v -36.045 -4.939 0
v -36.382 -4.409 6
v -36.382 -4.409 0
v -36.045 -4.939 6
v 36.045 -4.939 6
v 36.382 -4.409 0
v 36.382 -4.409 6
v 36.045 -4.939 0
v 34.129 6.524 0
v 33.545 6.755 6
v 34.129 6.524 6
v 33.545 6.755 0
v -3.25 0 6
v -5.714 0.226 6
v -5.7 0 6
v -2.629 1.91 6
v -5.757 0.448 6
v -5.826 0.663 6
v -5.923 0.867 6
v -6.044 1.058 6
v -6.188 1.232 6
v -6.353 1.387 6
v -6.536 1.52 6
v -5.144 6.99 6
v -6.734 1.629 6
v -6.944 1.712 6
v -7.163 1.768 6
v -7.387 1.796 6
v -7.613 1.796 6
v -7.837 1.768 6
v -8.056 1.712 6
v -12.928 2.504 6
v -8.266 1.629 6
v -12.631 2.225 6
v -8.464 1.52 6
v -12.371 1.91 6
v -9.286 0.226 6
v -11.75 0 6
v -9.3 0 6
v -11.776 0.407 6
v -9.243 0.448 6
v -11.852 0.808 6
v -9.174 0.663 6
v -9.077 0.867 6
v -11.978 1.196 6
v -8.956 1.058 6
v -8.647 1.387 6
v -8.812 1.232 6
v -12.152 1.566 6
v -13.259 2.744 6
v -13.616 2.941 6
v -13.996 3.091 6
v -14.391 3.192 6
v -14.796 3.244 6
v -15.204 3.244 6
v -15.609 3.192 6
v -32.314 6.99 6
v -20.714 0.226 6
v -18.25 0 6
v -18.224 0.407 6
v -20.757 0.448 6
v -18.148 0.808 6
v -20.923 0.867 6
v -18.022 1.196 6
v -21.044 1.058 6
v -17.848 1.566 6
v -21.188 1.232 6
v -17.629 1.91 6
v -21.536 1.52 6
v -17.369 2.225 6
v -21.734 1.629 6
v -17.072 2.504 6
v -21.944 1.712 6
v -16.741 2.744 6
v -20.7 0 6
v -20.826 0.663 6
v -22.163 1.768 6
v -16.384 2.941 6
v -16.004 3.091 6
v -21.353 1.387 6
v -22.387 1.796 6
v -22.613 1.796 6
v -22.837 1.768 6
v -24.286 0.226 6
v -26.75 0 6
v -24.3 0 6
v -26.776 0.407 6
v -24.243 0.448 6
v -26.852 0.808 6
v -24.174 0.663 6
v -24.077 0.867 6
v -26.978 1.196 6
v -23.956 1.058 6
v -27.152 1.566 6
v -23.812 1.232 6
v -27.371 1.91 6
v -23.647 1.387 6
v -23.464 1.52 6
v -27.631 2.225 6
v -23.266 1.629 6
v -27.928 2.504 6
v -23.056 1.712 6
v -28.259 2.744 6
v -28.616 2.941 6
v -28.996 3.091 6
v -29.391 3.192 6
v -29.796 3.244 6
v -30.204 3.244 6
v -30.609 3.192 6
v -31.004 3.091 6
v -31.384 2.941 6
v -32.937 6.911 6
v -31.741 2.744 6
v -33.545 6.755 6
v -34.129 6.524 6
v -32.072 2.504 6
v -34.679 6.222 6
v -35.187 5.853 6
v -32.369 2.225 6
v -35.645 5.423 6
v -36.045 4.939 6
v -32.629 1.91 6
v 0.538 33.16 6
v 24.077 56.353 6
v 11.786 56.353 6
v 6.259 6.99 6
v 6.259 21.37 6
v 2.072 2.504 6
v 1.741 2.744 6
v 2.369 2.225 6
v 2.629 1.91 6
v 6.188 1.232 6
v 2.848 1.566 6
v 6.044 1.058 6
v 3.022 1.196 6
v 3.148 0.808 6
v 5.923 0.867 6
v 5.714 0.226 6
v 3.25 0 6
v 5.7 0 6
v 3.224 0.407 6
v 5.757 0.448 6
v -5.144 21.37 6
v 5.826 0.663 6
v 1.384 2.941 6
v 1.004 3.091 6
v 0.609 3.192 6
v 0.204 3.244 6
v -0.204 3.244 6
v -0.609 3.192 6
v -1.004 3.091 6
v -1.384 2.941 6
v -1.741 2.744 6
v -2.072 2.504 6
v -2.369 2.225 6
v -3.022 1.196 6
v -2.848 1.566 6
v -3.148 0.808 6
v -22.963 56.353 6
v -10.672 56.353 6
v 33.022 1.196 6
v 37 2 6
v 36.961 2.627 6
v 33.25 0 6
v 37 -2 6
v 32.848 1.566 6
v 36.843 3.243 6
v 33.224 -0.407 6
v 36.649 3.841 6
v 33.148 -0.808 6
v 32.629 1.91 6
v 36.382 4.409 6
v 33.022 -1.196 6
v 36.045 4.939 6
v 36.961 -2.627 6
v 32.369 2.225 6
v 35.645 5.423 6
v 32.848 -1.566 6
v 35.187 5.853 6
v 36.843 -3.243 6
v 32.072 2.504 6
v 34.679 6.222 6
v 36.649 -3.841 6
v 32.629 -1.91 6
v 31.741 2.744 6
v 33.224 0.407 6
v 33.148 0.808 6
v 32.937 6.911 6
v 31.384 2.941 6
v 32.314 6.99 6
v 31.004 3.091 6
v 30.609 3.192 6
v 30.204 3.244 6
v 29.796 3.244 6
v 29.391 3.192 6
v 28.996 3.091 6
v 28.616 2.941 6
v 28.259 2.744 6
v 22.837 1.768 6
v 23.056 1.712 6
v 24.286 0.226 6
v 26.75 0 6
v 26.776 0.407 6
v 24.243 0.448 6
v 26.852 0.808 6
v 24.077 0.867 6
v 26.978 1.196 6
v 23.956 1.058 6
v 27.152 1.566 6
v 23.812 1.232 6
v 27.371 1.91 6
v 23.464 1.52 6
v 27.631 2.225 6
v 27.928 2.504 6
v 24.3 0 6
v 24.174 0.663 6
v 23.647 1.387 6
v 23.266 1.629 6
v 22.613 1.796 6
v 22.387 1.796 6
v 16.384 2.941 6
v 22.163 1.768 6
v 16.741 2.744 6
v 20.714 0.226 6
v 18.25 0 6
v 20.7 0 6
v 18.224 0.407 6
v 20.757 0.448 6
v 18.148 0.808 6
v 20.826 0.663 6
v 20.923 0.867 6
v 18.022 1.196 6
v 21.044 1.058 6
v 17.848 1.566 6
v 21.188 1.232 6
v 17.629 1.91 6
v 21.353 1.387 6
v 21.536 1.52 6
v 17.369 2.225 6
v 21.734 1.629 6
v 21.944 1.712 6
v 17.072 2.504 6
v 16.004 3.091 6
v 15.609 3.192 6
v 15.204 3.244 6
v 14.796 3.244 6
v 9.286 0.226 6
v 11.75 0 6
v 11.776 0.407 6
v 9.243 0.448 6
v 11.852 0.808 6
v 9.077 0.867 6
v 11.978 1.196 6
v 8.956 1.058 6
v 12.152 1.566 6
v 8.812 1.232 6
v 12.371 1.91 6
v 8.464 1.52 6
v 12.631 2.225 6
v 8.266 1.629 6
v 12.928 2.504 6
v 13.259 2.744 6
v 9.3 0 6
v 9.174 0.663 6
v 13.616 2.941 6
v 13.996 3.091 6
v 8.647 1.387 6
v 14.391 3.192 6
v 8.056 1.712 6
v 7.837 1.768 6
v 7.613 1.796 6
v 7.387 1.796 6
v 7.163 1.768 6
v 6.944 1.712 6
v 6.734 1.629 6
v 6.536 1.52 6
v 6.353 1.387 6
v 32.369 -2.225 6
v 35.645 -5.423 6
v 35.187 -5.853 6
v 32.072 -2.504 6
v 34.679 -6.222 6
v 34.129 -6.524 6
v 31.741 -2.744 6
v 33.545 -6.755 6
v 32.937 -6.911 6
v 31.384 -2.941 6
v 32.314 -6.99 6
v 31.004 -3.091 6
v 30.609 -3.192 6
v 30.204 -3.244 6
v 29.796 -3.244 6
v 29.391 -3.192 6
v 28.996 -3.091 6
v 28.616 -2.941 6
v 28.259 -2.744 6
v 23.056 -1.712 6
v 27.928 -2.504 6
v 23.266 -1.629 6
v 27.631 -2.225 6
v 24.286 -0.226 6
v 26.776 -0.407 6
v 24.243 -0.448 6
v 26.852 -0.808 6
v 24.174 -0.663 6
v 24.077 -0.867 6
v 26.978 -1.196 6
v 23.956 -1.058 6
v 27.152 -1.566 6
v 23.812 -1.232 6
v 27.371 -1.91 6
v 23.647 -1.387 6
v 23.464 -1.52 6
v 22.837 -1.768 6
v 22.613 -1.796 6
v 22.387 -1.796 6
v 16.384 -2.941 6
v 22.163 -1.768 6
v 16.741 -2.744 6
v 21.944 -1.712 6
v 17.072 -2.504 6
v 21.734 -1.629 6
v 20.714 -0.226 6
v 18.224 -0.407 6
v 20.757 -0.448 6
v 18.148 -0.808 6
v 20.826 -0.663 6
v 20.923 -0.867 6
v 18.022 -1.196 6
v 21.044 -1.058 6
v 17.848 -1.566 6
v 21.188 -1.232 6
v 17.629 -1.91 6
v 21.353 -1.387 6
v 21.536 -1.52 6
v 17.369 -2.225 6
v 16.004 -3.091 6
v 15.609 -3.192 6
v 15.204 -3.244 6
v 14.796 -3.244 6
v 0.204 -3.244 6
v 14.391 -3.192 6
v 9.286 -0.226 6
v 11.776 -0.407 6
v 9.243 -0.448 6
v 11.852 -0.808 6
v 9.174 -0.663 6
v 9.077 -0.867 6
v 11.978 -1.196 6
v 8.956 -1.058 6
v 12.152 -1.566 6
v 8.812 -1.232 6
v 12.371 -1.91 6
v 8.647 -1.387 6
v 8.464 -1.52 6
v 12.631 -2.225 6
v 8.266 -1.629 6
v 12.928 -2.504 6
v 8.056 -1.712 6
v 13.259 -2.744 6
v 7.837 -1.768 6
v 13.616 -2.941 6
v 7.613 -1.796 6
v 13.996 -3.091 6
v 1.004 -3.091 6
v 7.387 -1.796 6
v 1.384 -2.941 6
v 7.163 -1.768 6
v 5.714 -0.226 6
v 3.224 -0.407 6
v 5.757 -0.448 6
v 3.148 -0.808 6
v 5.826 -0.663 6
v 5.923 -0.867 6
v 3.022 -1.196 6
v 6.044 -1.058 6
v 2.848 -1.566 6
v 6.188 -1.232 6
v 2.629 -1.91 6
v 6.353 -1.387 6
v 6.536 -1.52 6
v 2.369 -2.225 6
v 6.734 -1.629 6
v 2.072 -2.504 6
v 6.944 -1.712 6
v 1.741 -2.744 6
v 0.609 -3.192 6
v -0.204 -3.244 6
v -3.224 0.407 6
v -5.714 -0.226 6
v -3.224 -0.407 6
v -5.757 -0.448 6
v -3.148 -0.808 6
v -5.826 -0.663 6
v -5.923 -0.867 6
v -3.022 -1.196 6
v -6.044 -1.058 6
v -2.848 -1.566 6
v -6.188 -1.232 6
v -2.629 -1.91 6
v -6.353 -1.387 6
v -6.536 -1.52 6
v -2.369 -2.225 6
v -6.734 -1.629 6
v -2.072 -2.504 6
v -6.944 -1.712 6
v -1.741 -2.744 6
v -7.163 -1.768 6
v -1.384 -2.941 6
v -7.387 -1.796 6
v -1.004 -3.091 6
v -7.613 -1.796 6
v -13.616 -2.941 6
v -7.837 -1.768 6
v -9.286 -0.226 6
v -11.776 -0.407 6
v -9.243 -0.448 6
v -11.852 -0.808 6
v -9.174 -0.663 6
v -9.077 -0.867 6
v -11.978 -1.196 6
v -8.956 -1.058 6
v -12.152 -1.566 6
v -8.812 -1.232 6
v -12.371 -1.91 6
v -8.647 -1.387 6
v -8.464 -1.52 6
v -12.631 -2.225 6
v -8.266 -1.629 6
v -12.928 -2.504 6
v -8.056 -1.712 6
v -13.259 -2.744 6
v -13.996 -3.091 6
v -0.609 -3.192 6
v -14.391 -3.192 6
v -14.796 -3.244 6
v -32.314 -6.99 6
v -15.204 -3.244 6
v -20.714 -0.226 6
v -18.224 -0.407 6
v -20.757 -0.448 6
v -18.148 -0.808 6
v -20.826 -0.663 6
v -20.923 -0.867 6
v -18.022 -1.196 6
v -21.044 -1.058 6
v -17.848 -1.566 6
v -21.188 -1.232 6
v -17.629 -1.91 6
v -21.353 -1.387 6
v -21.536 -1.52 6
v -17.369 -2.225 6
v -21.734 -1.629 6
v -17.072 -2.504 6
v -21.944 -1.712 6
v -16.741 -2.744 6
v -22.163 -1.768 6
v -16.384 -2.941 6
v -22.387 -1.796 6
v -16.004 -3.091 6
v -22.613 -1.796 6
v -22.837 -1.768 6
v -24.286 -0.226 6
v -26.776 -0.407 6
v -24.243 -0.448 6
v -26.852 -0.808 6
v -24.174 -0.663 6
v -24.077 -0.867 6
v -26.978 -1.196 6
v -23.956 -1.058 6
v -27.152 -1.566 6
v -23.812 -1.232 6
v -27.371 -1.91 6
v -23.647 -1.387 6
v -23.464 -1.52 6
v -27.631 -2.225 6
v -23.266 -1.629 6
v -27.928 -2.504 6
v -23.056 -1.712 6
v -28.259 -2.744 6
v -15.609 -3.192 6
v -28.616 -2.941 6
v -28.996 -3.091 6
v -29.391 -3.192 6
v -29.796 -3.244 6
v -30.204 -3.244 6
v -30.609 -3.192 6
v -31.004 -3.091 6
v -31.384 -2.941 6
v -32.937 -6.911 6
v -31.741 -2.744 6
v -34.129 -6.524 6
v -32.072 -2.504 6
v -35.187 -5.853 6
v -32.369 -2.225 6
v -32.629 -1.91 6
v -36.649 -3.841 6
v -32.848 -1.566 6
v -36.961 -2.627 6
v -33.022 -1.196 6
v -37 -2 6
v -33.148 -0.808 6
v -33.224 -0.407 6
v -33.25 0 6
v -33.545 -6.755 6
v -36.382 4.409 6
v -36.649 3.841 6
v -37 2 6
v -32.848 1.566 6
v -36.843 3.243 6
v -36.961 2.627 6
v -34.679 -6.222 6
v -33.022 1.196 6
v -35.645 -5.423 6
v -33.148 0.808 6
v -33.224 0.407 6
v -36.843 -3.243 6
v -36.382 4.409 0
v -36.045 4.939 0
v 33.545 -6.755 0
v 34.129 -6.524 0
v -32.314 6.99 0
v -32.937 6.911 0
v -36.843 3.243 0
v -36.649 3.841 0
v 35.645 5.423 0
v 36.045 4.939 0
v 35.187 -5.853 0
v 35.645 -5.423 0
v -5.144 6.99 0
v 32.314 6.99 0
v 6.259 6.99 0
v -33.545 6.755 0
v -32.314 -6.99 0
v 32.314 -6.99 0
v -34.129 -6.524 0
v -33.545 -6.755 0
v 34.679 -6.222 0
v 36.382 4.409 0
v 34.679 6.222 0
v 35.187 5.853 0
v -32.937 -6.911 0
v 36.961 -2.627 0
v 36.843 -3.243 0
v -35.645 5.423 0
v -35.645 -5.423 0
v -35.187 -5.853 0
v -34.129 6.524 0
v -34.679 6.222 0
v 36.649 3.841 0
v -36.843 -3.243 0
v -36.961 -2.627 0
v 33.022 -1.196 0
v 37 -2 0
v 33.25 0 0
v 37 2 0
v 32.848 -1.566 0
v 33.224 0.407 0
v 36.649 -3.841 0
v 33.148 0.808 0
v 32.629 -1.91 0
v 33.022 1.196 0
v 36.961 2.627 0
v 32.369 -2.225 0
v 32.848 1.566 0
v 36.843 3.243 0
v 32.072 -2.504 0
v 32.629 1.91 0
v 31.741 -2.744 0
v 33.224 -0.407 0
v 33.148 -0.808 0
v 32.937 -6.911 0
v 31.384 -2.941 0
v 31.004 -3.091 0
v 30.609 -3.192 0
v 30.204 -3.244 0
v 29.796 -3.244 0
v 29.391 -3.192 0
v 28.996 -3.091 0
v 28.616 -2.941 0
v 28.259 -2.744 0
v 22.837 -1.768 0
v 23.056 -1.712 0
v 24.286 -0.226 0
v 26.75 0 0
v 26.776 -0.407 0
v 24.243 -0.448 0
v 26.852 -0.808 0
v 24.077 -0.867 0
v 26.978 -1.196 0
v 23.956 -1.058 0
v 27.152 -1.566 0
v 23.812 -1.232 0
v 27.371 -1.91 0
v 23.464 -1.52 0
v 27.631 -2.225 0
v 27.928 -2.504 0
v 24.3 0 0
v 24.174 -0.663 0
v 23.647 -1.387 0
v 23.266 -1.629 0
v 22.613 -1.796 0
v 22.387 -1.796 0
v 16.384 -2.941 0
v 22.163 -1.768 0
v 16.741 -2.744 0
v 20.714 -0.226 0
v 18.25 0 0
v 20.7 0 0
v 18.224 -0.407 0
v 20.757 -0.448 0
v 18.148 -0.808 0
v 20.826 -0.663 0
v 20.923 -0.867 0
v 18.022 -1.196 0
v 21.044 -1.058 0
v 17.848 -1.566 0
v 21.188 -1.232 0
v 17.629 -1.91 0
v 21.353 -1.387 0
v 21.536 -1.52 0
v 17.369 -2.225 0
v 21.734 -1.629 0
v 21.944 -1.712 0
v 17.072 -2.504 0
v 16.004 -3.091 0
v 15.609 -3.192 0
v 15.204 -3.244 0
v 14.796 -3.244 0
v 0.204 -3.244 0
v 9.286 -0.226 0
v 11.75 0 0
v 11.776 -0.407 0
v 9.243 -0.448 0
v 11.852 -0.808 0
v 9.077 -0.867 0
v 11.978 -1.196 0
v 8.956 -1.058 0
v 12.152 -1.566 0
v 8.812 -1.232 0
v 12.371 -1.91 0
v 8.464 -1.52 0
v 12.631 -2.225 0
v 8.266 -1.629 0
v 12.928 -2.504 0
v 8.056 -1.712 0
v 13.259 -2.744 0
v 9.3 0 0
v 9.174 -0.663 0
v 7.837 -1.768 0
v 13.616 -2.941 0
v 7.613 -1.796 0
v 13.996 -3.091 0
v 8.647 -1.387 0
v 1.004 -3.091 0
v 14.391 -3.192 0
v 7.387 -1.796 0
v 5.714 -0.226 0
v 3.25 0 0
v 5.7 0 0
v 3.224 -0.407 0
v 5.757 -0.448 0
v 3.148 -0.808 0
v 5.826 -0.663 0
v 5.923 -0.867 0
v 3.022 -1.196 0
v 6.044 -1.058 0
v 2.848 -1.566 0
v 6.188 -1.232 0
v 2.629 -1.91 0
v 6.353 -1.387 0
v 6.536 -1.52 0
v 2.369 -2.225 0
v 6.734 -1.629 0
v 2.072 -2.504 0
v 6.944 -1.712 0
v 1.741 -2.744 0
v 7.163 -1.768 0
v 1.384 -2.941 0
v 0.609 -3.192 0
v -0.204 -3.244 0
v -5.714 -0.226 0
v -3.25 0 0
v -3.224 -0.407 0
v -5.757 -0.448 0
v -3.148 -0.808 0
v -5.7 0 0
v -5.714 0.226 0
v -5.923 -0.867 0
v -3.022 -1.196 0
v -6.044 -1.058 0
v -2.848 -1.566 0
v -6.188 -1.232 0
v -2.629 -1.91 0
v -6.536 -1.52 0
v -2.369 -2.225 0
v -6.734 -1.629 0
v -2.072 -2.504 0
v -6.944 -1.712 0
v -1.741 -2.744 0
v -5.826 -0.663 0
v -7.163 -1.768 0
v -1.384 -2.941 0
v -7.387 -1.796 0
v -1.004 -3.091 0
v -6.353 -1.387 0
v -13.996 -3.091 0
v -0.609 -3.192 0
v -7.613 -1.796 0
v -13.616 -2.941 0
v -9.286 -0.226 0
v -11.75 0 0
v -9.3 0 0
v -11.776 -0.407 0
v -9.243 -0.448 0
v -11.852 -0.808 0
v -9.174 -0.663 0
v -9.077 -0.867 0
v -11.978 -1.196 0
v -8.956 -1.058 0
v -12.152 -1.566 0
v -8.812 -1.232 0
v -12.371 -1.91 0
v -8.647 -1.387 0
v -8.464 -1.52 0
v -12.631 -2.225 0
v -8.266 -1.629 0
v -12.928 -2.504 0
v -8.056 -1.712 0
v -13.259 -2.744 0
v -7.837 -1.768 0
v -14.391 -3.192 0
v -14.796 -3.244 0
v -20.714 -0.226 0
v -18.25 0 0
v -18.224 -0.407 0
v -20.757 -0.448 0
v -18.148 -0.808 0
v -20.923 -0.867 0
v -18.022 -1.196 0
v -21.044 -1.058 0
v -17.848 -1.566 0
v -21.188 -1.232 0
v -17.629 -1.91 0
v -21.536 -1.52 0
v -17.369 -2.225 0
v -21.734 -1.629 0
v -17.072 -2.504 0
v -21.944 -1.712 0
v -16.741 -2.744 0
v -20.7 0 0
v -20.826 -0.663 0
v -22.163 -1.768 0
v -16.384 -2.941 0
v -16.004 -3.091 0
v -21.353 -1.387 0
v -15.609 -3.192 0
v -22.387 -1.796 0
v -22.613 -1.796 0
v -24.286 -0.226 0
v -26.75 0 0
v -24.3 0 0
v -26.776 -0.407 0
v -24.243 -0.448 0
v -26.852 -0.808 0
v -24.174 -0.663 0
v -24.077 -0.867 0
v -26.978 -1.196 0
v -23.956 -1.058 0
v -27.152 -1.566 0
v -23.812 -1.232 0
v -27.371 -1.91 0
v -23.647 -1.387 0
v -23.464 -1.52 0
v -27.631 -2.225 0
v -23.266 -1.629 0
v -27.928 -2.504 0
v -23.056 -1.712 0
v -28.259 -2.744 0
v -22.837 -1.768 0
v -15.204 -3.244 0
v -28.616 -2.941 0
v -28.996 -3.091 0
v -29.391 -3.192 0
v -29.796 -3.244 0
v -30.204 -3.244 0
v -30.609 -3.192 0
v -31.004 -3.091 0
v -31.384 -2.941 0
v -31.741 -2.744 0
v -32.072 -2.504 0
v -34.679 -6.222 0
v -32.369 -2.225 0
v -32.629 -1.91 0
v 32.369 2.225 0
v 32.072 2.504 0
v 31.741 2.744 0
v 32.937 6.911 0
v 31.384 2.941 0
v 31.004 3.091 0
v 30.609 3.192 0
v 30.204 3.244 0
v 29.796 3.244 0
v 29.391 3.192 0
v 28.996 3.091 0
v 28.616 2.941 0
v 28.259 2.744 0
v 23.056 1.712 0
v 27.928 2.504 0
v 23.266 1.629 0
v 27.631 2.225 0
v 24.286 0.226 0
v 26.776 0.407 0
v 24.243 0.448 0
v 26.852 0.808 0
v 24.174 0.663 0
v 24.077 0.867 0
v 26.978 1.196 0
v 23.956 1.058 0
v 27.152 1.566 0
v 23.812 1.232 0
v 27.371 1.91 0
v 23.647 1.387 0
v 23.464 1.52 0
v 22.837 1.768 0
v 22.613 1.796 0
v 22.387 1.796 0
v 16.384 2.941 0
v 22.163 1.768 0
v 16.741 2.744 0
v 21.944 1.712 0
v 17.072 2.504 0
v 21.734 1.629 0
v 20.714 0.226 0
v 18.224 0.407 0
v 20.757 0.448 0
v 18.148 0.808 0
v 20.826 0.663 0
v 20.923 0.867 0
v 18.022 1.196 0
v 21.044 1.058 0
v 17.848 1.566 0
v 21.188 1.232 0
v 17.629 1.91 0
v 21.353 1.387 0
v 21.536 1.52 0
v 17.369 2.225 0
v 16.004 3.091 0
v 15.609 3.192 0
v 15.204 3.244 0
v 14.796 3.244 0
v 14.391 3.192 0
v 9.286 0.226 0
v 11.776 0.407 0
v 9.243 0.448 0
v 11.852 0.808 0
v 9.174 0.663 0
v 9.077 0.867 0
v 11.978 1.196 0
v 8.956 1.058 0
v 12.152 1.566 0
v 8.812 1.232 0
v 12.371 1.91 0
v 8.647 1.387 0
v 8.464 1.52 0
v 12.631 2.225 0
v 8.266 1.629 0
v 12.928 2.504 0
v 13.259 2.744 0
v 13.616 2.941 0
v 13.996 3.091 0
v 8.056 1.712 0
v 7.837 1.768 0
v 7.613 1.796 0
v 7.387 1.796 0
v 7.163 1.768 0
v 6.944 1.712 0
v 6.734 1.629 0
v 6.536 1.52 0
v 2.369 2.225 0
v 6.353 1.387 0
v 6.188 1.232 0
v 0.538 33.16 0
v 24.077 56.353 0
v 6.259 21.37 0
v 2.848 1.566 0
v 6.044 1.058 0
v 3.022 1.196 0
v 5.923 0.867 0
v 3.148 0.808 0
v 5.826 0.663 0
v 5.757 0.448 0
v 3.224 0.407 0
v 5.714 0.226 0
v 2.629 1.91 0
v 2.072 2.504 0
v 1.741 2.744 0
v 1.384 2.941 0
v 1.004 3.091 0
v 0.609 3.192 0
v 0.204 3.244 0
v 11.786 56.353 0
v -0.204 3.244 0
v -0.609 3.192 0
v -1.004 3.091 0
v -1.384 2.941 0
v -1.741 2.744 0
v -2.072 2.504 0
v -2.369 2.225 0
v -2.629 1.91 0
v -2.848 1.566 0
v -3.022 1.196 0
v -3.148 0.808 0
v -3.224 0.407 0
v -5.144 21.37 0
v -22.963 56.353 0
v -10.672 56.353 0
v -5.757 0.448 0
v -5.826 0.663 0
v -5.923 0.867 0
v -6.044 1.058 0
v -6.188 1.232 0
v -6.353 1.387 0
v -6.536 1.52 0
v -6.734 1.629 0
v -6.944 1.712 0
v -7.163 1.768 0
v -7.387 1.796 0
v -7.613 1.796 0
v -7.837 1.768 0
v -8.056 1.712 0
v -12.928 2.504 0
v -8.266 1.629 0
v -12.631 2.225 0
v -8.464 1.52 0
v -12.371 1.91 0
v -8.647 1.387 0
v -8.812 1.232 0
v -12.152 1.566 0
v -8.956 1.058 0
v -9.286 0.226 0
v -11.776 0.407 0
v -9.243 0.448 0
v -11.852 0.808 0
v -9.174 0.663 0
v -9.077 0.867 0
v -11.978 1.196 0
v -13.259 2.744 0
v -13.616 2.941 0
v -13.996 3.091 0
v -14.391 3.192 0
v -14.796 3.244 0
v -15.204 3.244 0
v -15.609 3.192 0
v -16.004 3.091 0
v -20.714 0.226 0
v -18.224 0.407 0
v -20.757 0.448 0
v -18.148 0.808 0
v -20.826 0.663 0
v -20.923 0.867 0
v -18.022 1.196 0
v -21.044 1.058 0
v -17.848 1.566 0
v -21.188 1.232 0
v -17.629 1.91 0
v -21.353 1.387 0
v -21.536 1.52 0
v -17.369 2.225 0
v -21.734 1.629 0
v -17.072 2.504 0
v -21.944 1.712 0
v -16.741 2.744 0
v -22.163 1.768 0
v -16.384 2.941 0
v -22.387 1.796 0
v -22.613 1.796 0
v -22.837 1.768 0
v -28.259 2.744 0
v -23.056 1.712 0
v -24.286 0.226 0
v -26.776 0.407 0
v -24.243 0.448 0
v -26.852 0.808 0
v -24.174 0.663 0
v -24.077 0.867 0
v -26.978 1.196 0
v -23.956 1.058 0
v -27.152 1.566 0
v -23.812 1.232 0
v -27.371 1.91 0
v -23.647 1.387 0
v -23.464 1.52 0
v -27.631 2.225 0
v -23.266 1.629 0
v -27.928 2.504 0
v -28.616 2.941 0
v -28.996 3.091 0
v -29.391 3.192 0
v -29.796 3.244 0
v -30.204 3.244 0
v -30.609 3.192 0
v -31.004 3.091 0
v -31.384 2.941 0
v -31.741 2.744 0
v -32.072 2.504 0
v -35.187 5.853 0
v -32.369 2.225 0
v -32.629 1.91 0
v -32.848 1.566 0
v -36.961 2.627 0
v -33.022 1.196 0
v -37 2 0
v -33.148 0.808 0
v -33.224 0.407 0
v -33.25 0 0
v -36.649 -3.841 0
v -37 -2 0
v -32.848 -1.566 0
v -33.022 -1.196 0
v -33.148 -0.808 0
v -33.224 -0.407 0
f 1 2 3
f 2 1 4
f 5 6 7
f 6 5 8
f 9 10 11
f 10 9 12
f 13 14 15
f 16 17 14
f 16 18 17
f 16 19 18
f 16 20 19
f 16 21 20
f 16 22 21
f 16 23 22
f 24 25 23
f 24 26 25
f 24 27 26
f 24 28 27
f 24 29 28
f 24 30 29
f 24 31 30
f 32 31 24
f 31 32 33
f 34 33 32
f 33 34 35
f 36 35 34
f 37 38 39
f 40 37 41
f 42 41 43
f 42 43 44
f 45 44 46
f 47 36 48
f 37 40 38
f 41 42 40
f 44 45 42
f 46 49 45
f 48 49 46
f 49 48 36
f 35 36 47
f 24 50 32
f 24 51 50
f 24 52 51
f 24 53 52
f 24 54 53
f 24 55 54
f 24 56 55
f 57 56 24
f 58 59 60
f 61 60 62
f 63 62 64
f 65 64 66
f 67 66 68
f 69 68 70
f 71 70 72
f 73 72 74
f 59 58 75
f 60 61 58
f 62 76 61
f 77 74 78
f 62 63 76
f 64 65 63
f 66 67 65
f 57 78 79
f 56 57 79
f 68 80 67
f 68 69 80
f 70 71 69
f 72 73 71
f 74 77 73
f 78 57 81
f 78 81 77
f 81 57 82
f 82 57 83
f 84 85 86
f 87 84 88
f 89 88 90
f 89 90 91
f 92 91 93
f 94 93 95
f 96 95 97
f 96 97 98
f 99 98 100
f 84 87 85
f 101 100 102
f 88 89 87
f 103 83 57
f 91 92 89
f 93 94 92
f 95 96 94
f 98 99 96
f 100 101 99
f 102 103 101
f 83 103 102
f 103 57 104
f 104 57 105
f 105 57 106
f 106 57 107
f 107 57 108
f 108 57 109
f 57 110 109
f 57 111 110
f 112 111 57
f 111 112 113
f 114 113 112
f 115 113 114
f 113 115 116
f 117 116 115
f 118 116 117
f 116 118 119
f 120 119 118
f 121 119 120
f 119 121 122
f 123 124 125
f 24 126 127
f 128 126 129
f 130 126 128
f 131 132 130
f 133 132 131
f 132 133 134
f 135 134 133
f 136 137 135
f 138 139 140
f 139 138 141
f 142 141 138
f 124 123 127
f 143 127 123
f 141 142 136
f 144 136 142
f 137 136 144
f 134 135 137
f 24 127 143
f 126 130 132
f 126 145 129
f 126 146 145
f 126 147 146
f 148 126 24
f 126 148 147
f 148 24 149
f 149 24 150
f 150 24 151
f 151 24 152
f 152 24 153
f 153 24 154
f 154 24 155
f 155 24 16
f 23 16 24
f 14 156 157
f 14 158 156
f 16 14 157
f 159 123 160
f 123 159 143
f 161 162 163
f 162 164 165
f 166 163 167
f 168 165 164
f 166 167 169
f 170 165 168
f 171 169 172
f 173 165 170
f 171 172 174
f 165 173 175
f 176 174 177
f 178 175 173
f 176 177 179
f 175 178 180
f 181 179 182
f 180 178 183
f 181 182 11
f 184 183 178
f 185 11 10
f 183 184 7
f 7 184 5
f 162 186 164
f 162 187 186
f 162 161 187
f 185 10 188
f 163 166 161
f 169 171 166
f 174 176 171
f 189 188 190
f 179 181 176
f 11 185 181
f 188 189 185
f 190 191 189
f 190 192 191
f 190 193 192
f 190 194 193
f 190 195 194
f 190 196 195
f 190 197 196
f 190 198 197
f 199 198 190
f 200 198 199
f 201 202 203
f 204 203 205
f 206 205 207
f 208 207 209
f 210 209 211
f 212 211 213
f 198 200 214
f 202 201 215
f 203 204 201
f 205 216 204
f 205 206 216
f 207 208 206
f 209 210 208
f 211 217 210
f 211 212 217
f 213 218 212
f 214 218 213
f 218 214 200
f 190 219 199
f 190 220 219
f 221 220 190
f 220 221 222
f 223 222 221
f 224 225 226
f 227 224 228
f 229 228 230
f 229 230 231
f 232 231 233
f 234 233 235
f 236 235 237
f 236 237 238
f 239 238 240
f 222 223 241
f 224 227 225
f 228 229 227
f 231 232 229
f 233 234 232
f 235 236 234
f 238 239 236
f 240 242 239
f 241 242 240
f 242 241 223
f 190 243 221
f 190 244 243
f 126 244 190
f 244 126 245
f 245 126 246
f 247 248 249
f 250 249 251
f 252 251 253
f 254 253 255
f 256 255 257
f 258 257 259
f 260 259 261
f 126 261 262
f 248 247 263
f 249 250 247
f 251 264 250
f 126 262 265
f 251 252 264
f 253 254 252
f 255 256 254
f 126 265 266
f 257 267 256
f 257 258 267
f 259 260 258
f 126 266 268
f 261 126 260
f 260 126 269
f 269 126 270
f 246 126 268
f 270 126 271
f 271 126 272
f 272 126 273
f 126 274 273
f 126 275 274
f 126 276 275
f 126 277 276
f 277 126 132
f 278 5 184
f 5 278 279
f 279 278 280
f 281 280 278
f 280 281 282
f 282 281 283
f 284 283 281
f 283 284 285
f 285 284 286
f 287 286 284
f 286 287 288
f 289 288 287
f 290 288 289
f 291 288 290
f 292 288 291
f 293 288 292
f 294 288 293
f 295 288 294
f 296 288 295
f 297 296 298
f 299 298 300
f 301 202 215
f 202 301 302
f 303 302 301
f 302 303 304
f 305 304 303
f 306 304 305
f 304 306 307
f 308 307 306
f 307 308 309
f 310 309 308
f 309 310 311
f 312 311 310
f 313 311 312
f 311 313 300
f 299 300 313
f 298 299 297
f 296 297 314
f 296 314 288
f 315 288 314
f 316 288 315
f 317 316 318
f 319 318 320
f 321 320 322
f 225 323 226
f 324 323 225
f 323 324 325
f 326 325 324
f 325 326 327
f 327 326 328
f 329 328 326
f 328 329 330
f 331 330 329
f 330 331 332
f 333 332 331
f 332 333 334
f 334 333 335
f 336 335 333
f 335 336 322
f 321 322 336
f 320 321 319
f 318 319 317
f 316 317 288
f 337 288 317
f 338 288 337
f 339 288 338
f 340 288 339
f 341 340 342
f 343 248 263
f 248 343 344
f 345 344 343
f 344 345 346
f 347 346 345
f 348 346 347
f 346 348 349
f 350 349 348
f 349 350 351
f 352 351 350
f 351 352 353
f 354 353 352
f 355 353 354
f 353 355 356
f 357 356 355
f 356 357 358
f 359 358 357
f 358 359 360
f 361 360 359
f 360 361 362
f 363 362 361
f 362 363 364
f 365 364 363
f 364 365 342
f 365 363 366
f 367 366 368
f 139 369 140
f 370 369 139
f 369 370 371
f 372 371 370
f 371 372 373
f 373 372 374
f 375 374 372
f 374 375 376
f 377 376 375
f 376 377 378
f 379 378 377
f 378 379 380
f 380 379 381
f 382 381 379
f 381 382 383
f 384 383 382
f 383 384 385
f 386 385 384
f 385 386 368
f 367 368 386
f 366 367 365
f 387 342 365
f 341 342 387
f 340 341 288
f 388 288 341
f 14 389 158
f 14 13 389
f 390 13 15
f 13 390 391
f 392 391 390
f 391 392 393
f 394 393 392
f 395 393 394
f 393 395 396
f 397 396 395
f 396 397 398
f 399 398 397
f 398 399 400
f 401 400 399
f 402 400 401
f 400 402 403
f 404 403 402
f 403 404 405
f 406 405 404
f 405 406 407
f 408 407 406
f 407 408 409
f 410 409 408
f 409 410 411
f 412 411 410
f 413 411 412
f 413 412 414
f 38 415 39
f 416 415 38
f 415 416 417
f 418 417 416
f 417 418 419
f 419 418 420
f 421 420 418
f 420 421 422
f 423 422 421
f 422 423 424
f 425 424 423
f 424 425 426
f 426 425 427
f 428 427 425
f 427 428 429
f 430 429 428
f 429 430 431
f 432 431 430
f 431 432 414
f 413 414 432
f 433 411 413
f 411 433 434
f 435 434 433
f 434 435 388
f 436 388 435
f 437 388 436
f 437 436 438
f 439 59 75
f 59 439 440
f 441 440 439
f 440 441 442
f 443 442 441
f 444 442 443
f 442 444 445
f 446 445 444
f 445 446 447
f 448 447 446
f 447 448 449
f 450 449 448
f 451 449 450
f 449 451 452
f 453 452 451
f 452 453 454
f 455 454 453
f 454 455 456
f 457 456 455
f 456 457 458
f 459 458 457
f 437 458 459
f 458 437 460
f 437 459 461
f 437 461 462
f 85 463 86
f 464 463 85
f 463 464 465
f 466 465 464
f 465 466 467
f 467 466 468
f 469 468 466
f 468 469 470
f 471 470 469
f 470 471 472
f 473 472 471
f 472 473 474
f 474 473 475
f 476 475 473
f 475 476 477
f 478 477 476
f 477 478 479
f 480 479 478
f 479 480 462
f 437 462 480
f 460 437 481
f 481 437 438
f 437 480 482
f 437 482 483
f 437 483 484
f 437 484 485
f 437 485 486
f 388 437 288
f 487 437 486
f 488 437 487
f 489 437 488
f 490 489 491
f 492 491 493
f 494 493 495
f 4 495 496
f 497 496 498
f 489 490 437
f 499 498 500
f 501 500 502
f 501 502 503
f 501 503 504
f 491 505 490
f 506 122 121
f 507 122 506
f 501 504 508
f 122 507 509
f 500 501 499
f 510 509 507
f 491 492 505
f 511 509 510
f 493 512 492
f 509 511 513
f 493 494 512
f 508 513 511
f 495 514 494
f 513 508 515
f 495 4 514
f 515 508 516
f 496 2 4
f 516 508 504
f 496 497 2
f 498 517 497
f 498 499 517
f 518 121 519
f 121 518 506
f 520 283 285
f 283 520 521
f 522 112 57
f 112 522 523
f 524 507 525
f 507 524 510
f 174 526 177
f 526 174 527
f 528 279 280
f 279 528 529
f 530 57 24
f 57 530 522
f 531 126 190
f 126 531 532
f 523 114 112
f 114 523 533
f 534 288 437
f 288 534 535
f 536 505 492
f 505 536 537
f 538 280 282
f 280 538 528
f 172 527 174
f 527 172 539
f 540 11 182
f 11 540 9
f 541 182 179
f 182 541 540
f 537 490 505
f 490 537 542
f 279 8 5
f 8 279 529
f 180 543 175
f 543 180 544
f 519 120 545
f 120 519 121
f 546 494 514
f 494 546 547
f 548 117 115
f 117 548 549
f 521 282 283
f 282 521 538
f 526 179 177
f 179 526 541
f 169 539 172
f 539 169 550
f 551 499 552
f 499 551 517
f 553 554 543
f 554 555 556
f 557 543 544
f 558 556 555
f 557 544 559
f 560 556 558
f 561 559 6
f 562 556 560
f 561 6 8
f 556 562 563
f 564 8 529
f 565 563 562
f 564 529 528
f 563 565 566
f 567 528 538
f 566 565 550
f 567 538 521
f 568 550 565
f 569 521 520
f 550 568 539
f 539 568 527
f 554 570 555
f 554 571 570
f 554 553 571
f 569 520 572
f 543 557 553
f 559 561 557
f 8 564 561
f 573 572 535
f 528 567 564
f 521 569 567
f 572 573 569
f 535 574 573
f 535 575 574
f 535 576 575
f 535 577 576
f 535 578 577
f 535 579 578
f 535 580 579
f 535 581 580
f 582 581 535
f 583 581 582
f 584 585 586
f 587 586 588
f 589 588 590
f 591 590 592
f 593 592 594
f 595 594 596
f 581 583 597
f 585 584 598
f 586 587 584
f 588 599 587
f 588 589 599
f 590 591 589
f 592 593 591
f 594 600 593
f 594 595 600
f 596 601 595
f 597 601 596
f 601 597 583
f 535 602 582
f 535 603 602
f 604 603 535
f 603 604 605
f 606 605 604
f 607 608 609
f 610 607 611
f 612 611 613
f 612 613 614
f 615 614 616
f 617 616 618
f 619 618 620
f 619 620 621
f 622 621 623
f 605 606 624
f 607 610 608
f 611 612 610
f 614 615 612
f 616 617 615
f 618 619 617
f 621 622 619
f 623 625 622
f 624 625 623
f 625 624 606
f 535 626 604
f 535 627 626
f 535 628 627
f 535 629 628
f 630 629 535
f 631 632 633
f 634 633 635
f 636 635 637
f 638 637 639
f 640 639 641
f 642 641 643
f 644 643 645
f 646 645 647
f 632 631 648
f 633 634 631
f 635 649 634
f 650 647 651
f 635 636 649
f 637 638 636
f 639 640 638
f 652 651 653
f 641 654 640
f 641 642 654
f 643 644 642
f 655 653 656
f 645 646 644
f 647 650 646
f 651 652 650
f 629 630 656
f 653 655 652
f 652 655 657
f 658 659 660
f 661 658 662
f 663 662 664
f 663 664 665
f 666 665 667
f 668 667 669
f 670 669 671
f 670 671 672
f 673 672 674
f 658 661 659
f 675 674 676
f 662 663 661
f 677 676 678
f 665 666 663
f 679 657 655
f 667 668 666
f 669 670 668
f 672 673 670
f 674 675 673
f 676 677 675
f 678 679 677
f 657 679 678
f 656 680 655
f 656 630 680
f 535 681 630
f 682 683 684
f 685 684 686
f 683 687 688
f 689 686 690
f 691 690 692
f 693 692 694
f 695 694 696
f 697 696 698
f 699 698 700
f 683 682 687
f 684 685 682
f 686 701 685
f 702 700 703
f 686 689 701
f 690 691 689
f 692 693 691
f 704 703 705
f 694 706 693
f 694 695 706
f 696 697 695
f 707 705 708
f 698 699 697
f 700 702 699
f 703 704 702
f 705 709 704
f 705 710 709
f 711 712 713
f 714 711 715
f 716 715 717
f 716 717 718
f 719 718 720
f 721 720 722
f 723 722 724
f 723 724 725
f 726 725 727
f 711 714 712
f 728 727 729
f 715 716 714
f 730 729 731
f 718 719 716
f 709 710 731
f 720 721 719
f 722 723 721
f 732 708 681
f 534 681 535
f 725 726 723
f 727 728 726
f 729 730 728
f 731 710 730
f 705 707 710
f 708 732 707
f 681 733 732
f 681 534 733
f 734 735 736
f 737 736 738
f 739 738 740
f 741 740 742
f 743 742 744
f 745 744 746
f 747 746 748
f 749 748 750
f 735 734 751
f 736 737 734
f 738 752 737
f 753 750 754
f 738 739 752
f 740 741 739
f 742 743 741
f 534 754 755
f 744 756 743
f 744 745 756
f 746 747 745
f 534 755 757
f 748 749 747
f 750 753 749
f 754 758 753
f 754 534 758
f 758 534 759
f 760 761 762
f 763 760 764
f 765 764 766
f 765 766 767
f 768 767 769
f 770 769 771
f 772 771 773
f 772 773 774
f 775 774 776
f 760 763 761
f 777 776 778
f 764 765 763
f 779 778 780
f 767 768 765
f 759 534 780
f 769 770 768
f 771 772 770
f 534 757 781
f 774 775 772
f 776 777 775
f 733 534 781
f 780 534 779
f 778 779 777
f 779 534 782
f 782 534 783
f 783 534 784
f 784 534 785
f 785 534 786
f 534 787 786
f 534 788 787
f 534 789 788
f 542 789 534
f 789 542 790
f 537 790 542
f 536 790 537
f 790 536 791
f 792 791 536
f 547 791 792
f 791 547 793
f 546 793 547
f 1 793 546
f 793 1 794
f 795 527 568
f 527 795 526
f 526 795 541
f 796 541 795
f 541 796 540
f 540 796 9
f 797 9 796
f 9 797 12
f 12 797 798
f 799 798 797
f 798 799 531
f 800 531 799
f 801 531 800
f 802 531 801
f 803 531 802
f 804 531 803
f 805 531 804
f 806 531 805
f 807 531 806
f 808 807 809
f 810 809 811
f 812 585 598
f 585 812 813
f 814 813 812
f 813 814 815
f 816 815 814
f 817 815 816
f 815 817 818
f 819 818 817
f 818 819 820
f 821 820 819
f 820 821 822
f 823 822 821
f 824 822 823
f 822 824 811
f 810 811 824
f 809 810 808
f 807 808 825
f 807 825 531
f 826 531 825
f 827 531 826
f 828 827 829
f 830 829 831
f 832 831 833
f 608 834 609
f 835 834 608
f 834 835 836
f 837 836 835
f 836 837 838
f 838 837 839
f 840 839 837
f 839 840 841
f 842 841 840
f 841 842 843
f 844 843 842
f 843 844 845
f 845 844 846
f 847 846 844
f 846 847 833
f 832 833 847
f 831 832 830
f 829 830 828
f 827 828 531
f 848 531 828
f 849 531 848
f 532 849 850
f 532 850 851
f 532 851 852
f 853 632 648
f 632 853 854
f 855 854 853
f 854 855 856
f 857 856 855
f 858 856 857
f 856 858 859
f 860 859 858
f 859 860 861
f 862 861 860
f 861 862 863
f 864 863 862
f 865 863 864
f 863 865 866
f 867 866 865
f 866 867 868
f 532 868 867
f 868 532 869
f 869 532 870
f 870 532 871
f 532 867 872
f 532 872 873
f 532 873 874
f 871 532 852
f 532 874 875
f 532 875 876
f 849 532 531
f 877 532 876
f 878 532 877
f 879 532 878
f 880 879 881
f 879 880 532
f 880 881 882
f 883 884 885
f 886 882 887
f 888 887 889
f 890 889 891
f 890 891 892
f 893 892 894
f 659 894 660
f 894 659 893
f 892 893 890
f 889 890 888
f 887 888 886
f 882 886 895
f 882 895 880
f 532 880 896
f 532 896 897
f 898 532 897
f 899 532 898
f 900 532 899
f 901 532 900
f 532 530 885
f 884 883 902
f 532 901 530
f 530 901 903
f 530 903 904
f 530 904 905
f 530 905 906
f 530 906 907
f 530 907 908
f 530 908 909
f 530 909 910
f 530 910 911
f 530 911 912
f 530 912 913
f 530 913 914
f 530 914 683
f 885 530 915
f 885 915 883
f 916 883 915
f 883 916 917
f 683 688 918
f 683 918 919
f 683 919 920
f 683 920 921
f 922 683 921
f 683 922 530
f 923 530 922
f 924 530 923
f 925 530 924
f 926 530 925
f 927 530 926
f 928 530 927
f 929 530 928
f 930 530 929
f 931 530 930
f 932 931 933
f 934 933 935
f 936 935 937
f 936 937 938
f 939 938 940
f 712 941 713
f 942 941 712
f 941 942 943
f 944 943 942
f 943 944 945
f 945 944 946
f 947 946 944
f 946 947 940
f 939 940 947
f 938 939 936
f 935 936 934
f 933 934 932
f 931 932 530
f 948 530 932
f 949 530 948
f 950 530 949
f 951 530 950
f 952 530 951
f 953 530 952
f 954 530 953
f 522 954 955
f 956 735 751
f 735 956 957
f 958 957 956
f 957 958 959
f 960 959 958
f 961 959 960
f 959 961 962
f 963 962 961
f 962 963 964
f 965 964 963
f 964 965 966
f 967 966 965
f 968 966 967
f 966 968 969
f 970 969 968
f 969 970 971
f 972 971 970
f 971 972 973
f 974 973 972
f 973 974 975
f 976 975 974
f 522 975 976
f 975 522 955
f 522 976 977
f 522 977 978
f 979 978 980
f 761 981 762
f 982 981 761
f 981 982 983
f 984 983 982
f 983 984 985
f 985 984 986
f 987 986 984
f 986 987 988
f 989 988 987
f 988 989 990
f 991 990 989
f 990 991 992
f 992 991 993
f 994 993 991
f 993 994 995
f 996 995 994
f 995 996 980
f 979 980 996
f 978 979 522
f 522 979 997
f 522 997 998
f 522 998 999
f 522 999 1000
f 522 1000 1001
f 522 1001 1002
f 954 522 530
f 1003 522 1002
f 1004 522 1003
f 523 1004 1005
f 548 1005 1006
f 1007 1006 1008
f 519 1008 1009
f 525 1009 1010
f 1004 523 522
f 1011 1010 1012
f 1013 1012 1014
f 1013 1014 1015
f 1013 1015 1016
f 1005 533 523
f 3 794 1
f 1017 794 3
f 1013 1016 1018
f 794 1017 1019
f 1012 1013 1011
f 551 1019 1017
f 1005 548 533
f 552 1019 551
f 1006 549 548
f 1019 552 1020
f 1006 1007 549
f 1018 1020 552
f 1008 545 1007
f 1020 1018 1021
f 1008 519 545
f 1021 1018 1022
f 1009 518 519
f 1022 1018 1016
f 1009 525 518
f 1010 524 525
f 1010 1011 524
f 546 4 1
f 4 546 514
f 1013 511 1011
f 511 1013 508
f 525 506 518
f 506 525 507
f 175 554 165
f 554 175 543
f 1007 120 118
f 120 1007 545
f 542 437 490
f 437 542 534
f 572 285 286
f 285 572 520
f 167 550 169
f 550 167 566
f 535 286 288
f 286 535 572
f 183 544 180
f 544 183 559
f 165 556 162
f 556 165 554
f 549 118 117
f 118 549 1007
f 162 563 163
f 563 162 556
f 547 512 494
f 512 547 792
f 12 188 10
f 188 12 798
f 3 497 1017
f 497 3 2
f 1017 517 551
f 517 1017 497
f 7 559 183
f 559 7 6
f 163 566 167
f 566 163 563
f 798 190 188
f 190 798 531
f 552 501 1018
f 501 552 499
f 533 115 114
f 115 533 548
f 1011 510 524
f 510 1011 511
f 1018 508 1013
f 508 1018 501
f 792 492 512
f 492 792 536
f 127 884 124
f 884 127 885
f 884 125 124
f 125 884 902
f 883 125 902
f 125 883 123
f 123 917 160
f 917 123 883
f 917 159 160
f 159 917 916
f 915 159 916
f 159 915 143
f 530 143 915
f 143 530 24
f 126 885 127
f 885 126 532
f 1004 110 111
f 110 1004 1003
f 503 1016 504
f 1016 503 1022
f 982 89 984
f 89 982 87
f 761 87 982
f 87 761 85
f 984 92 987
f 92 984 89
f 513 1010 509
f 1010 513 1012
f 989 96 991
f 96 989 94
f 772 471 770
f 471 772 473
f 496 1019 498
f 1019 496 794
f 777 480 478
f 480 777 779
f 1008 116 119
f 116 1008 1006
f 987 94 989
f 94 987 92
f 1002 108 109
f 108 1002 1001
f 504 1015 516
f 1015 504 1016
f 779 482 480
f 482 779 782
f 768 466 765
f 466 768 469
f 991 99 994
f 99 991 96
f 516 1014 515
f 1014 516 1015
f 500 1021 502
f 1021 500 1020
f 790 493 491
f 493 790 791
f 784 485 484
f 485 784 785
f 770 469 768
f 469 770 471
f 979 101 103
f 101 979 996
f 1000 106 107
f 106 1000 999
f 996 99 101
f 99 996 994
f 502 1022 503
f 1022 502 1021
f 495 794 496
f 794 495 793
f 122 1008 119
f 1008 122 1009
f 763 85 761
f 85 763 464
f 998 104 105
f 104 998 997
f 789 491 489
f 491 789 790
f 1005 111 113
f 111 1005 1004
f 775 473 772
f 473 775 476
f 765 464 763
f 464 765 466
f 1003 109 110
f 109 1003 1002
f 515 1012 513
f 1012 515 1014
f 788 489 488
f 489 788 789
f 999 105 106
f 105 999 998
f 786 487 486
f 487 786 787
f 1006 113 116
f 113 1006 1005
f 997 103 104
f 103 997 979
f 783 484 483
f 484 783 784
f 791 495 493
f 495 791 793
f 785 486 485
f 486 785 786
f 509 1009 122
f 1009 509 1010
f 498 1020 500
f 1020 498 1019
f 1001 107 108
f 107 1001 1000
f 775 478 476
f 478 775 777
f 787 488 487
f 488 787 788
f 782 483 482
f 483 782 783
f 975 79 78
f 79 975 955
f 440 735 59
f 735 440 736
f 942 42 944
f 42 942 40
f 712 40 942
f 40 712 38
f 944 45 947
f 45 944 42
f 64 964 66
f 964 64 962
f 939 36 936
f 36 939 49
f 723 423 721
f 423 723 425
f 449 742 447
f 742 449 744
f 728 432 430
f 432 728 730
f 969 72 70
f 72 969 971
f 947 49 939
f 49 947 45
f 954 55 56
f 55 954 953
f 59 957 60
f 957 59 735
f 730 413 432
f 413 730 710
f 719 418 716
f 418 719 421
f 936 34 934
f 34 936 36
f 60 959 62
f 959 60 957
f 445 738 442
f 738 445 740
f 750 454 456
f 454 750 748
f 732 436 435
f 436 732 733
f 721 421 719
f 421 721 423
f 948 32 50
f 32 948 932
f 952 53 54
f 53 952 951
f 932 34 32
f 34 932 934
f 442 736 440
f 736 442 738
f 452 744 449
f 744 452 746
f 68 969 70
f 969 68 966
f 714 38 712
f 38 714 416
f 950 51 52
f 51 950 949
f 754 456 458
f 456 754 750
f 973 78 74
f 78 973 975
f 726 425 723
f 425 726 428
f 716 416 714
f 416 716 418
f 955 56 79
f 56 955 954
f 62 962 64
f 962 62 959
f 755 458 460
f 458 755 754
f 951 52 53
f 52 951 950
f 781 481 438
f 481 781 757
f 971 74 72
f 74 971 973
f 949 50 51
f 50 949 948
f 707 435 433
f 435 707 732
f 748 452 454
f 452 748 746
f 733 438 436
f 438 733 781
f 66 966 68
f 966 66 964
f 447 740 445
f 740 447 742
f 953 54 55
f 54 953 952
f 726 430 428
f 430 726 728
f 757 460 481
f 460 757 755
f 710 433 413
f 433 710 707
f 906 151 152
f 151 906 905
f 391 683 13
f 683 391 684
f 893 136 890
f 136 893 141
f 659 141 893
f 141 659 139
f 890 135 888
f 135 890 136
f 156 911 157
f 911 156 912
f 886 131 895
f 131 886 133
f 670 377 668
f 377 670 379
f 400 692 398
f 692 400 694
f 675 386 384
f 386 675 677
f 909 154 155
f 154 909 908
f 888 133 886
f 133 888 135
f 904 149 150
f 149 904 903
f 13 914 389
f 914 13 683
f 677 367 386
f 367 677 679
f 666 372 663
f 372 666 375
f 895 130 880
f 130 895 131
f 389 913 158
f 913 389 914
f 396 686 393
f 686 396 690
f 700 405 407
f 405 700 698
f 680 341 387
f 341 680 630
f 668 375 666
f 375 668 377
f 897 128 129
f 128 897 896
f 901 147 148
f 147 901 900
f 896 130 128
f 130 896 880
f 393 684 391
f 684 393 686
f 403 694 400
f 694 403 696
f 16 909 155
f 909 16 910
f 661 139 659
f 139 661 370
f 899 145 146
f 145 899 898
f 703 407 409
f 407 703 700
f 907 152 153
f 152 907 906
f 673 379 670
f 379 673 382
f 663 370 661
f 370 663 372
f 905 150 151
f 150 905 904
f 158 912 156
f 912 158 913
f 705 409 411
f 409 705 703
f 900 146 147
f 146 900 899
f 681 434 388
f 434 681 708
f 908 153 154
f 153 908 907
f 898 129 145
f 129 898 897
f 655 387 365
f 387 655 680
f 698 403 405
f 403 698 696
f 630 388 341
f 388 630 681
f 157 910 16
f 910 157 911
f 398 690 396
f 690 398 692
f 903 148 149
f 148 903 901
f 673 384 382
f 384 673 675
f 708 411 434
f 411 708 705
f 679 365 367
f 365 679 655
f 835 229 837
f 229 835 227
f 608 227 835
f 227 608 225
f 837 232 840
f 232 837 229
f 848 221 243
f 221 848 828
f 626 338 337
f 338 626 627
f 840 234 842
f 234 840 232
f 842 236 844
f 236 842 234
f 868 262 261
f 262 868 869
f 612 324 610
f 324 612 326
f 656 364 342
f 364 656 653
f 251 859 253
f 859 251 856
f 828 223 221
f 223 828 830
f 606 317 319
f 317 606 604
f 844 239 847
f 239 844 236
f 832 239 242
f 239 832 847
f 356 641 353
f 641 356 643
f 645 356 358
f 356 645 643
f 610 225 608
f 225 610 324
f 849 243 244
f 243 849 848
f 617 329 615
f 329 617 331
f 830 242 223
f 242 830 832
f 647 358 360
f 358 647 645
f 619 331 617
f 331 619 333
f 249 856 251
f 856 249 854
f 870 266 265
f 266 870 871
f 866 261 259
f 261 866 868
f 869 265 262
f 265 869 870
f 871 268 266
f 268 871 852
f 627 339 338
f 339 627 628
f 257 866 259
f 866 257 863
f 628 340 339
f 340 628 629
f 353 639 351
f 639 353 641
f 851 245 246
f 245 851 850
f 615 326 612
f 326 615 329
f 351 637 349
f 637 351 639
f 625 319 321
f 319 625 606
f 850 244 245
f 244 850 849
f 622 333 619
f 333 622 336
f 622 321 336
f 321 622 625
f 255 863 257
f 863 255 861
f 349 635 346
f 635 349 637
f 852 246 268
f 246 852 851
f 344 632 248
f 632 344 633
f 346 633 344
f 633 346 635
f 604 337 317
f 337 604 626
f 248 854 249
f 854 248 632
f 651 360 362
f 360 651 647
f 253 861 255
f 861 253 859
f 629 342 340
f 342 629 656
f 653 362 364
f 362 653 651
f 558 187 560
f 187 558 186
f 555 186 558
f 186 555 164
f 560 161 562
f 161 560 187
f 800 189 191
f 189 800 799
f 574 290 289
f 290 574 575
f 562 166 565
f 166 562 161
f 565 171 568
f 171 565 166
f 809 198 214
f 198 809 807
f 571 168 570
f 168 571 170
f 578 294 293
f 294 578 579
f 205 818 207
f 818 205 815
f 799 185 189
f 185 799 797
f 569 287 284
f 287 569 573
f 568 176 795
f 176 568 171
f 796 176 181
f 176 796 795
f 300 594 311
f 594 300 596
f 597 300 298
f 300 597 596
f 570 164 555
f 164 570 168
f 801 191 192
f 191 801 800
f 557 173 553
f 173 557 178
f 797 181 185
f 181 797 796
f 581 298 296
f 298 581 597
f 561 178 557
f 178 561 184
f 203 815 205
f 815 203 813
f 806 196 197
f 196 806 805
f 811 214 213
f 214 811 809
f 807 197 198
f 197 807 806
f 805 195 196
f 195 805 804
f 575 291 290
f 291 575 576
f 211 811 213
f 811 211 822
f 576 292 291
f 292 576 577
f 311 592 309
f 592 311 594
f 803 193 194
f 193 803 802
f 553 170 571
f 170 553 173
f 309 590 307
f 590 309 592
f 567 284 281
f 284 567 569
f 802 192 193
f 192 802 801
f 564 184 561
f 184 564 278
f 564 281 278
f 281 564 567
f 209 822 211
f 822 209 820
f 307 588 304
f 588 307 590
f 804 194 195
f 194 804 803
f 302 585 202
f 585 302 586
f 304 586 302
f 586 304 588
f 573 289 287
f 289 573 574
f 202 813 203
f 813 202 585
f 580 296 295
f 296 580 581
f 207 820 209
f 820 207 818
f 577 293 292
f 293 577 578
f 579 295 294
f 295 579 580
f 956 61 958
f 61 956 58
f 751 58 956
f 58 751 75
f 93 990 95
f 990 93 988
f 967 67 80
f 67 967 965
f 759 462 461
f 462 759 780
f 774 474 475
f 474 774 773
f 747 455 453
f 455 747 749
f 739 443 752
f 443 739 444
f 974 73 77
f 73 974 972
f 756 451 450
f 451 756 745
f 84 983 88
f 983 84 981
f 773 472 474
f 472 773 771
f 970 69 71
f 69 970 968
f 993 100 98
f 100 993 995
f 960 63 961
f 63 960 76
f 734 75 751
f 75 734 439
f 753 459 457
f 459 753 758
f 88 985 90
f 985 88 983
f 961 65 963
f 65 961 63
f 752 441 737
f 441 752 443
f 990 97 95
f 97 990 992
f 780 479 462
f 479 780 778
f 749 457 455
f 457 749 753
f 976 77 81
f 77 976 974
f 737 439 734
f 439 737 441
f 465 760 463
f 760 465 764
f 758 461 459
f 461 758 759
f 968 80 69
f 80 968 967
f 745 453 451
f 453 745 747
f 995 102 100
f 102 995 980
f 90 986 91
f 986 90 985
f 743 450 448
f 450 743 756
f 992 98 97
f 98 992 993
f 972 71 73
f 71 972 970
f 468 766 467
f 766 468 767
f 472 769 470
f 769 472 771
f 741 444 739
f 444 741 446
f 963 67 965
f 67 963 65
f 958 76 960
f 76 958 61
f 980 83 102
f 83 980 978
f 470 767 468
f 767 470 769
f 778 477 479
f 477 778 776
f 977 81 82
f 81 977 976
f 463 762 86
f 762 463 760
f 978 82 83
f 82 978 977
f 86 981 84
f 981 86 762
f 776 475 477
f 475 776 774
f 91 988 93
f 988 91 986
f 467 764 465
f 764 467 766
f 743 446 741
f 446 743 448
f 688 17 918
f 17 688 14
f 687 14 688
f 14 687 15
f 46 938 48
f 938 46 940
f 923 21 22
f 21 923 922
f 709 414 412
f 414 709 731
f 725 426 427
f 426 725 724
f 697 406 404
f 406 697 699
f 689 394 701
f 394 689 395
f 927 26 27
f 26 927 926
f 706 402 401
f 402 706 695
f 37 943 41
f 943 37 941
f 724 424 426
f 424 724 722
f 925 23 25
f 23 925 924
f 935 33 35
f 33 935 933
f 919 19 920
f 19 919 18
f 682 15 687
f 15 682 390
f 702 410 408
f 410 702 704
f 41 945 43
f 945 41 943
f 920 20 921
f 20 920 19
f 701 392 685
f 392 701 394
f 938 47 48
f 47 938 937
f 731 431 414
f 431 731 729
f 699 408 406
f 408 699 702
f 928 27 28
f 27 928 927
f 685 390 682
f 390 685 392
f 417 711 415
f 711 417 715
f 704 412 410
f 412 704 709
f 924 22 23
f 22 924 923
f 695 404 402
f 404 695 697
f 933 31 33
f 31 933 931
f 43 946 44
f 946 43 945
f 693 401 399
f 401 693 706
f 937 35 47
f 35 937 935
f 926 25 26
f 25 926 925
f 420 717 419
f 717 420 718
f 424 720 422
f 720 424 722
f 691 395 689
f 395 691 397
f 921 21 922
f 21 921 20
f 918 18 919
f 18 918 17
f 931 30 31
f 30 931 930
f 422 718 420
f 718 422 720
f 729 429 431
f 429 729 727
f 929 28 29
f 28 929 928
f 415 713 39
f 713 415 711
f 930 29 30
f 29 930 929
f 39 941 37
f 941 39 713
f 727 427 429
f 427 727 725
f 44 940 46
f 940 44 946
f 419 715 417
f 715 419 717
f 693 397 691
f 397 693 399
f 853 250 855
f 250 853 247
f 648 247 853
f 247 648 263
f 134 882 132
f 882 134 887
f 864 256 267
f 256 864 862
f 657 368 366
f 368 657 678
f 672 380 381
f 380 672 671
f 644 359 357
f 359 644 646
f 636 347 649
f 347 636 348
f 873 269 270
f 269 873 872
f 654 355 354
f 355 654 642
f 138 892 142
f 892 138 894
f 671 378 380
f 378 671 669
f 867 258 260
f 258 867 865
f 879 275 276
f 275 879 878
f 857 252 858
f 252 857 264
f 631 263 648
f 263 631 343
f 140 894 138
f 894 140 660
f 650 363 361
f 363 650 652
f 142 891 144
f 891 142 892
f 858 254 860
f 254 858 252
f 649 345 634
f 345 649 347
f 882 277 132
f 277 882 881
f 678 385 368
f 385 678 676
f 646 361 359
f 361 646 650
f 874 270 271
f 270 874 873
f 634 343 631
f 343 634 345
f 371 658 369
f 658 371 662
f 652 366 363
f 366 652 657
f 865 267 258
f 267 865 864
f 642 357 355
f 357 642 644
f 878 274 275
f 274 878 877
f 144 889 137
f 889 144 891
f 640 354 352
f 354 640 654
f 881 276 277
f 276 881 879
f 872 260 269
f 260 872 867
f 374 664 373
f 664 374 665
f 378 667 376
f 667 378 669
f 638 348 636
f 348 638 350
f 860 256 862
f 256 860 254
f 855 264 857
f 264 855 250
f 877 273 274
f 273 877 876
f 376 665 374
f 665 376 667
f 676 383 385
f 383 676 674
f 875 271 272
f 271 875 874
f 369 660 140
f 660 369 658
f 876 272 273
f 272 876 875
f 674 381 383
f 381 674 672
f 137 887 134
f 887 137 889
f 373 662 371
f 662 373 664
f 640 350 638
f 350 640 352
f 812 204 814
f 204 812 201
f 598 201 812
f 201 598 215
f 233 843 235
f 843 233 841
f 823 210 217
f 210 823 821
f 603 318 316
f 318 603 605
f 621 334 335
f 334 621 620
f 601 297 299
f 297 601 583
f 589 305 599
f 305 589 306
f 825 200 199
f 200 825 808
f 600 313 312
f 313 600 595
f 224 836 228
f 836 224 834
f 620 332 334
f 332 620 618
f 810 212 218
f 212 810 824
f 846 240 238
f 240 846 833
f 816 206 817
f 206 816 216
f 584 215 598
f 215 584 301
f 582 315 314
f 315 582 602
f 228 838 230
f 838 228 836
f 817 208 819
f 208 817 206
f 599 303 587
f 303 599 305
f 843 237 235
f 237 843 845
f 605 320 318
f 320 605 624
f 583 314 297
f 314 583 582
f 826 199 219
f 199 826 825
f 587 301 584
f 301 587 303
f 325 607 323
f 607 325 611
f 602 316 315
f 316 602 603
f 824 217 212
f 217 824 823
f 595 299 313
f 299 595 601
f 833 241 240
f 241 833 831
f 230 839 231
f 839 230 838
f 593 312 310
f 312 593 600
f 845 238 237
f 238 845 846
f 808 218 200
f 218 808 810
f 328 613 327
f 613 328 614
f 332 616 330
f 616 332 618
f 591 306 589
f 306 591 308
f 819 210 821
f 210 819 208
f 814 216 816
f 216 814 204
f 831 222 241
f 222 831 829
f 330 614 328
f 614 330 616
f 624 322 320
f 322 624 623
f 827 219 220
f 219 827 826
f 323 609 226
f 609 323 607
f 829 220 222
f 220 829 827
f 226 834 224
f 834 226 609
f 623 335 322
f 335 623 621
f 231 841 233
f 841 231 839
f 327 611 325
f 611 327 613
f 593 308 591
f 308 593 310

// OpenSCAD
$fn = 50;


difference() {
	union() {
		hull() {
			translate(v = [-32.0000000000, 2.0000000000, 0]) {
				cylinder(h = 6, r = 5);
			}
			translate(v = [32.0000000000, 2.0000000000, 0]) {
				cylinder(h = 6, r = 5);
			}
			translate(v = [-32.0000000000, -2.0000000000, 0]) {
				cylinder(h = 6, r = 5);
			}
			translate(v = [32.0000000000, -2.0000000000, 0]) {
				cylinder(h = 6, r = 5);
			}
		}
		translate(v = [0, 55, 0]) {
			linear_extrude(height = 6) {
				text(font = "DejaVu Sans Mono:style=Bold", halign = "center", size = 57.0000000000, text = "Y", valign = "top");
			}
		}
	}
	union() {
		translate(v = [-30.0000000000, 0.0000000000, 0]) {
			translate(v = [0, 0, -100]) {
				cylinder(h = 200, r = 3.2500000000);
			}
		}
		translate(v = [-15.0000000000, 0.0000000000, 0]) {
			translate(v = [0, 0, -100]) {
				cylinder(h = 200, r = 3.2500000000);
			}
		}
		translate(v = [0, 0, -100]) {
			cylinder(h = 200, r = 3.2500000000);
		}
		translate(v = [15.0000000000, 0.0000000000, 0]) {
			translate(v = [0, 0, -100]) {
				cylinder(h = 200, r = 3.2500000000);
			}
		}
		translate(v = [30.0000000000, 0.0000000000, 0]) {
			translate(v = [0, 0, -100]) {
				cylinder(h = 200, r = 3.2500000000);
			}
		}
		translate(v = [-30.0000000000, 0.0000000000, 0]) {
			translate(v = [0, 0, -100]) {
				cylinder(h = 200, r = 1.8000000000);
			}
		}
		translate(v = [-22.5000000000, 0.0000000000, 0]) {
			translate(v = [0, 0, -100]) {
				cylinder(h = 200, r = 1.8000000000);
			}
		}
		translate(v = [-15.0000000000, 0.0000000000, 0]) {
			translate(v = [0, 0, -100]) {
				cylinder(h = 200, r = 1.8000000000);
			}
		}
		translate(v = [-7.5000000000, 0.0000000000, 0]) {
			translate(v = [0, 0, -100]) {
				cylinder(h = 200, r = 1.8000000000);
			}
		}
		translate(v = [0, 0, -100]) {
			cylinder(h = 200, r = 1.8000000000);
		}
		translate(v = [7.5000000000, 0.0000000000, 0]) {
			translate(v = [0, 0, -100]) {
				cylinder(h = 200, r = 1.8000000000);
			}
		}
		translate(v = [15.0000000000, 0.0000000000, 0]) {
			translate(v = [0, 0, -100]) {
				cylinder(h = 200, r = 1.8000000000);
			}
		}
		translate(v = [22.5000000000, 0.0000000000, 0]) {
			translate(v = [0, 0, -100]) {
				cylinder(h = 200, r = 1.8000000000);
			}
		}
		translate(v = [30.0000000000, 0.0000000000, 0]) {
			translate(v = [0, 0, -100]) {
				cylinder(h = 200, r = 1.8000000000);
			}
		}
	}
}
